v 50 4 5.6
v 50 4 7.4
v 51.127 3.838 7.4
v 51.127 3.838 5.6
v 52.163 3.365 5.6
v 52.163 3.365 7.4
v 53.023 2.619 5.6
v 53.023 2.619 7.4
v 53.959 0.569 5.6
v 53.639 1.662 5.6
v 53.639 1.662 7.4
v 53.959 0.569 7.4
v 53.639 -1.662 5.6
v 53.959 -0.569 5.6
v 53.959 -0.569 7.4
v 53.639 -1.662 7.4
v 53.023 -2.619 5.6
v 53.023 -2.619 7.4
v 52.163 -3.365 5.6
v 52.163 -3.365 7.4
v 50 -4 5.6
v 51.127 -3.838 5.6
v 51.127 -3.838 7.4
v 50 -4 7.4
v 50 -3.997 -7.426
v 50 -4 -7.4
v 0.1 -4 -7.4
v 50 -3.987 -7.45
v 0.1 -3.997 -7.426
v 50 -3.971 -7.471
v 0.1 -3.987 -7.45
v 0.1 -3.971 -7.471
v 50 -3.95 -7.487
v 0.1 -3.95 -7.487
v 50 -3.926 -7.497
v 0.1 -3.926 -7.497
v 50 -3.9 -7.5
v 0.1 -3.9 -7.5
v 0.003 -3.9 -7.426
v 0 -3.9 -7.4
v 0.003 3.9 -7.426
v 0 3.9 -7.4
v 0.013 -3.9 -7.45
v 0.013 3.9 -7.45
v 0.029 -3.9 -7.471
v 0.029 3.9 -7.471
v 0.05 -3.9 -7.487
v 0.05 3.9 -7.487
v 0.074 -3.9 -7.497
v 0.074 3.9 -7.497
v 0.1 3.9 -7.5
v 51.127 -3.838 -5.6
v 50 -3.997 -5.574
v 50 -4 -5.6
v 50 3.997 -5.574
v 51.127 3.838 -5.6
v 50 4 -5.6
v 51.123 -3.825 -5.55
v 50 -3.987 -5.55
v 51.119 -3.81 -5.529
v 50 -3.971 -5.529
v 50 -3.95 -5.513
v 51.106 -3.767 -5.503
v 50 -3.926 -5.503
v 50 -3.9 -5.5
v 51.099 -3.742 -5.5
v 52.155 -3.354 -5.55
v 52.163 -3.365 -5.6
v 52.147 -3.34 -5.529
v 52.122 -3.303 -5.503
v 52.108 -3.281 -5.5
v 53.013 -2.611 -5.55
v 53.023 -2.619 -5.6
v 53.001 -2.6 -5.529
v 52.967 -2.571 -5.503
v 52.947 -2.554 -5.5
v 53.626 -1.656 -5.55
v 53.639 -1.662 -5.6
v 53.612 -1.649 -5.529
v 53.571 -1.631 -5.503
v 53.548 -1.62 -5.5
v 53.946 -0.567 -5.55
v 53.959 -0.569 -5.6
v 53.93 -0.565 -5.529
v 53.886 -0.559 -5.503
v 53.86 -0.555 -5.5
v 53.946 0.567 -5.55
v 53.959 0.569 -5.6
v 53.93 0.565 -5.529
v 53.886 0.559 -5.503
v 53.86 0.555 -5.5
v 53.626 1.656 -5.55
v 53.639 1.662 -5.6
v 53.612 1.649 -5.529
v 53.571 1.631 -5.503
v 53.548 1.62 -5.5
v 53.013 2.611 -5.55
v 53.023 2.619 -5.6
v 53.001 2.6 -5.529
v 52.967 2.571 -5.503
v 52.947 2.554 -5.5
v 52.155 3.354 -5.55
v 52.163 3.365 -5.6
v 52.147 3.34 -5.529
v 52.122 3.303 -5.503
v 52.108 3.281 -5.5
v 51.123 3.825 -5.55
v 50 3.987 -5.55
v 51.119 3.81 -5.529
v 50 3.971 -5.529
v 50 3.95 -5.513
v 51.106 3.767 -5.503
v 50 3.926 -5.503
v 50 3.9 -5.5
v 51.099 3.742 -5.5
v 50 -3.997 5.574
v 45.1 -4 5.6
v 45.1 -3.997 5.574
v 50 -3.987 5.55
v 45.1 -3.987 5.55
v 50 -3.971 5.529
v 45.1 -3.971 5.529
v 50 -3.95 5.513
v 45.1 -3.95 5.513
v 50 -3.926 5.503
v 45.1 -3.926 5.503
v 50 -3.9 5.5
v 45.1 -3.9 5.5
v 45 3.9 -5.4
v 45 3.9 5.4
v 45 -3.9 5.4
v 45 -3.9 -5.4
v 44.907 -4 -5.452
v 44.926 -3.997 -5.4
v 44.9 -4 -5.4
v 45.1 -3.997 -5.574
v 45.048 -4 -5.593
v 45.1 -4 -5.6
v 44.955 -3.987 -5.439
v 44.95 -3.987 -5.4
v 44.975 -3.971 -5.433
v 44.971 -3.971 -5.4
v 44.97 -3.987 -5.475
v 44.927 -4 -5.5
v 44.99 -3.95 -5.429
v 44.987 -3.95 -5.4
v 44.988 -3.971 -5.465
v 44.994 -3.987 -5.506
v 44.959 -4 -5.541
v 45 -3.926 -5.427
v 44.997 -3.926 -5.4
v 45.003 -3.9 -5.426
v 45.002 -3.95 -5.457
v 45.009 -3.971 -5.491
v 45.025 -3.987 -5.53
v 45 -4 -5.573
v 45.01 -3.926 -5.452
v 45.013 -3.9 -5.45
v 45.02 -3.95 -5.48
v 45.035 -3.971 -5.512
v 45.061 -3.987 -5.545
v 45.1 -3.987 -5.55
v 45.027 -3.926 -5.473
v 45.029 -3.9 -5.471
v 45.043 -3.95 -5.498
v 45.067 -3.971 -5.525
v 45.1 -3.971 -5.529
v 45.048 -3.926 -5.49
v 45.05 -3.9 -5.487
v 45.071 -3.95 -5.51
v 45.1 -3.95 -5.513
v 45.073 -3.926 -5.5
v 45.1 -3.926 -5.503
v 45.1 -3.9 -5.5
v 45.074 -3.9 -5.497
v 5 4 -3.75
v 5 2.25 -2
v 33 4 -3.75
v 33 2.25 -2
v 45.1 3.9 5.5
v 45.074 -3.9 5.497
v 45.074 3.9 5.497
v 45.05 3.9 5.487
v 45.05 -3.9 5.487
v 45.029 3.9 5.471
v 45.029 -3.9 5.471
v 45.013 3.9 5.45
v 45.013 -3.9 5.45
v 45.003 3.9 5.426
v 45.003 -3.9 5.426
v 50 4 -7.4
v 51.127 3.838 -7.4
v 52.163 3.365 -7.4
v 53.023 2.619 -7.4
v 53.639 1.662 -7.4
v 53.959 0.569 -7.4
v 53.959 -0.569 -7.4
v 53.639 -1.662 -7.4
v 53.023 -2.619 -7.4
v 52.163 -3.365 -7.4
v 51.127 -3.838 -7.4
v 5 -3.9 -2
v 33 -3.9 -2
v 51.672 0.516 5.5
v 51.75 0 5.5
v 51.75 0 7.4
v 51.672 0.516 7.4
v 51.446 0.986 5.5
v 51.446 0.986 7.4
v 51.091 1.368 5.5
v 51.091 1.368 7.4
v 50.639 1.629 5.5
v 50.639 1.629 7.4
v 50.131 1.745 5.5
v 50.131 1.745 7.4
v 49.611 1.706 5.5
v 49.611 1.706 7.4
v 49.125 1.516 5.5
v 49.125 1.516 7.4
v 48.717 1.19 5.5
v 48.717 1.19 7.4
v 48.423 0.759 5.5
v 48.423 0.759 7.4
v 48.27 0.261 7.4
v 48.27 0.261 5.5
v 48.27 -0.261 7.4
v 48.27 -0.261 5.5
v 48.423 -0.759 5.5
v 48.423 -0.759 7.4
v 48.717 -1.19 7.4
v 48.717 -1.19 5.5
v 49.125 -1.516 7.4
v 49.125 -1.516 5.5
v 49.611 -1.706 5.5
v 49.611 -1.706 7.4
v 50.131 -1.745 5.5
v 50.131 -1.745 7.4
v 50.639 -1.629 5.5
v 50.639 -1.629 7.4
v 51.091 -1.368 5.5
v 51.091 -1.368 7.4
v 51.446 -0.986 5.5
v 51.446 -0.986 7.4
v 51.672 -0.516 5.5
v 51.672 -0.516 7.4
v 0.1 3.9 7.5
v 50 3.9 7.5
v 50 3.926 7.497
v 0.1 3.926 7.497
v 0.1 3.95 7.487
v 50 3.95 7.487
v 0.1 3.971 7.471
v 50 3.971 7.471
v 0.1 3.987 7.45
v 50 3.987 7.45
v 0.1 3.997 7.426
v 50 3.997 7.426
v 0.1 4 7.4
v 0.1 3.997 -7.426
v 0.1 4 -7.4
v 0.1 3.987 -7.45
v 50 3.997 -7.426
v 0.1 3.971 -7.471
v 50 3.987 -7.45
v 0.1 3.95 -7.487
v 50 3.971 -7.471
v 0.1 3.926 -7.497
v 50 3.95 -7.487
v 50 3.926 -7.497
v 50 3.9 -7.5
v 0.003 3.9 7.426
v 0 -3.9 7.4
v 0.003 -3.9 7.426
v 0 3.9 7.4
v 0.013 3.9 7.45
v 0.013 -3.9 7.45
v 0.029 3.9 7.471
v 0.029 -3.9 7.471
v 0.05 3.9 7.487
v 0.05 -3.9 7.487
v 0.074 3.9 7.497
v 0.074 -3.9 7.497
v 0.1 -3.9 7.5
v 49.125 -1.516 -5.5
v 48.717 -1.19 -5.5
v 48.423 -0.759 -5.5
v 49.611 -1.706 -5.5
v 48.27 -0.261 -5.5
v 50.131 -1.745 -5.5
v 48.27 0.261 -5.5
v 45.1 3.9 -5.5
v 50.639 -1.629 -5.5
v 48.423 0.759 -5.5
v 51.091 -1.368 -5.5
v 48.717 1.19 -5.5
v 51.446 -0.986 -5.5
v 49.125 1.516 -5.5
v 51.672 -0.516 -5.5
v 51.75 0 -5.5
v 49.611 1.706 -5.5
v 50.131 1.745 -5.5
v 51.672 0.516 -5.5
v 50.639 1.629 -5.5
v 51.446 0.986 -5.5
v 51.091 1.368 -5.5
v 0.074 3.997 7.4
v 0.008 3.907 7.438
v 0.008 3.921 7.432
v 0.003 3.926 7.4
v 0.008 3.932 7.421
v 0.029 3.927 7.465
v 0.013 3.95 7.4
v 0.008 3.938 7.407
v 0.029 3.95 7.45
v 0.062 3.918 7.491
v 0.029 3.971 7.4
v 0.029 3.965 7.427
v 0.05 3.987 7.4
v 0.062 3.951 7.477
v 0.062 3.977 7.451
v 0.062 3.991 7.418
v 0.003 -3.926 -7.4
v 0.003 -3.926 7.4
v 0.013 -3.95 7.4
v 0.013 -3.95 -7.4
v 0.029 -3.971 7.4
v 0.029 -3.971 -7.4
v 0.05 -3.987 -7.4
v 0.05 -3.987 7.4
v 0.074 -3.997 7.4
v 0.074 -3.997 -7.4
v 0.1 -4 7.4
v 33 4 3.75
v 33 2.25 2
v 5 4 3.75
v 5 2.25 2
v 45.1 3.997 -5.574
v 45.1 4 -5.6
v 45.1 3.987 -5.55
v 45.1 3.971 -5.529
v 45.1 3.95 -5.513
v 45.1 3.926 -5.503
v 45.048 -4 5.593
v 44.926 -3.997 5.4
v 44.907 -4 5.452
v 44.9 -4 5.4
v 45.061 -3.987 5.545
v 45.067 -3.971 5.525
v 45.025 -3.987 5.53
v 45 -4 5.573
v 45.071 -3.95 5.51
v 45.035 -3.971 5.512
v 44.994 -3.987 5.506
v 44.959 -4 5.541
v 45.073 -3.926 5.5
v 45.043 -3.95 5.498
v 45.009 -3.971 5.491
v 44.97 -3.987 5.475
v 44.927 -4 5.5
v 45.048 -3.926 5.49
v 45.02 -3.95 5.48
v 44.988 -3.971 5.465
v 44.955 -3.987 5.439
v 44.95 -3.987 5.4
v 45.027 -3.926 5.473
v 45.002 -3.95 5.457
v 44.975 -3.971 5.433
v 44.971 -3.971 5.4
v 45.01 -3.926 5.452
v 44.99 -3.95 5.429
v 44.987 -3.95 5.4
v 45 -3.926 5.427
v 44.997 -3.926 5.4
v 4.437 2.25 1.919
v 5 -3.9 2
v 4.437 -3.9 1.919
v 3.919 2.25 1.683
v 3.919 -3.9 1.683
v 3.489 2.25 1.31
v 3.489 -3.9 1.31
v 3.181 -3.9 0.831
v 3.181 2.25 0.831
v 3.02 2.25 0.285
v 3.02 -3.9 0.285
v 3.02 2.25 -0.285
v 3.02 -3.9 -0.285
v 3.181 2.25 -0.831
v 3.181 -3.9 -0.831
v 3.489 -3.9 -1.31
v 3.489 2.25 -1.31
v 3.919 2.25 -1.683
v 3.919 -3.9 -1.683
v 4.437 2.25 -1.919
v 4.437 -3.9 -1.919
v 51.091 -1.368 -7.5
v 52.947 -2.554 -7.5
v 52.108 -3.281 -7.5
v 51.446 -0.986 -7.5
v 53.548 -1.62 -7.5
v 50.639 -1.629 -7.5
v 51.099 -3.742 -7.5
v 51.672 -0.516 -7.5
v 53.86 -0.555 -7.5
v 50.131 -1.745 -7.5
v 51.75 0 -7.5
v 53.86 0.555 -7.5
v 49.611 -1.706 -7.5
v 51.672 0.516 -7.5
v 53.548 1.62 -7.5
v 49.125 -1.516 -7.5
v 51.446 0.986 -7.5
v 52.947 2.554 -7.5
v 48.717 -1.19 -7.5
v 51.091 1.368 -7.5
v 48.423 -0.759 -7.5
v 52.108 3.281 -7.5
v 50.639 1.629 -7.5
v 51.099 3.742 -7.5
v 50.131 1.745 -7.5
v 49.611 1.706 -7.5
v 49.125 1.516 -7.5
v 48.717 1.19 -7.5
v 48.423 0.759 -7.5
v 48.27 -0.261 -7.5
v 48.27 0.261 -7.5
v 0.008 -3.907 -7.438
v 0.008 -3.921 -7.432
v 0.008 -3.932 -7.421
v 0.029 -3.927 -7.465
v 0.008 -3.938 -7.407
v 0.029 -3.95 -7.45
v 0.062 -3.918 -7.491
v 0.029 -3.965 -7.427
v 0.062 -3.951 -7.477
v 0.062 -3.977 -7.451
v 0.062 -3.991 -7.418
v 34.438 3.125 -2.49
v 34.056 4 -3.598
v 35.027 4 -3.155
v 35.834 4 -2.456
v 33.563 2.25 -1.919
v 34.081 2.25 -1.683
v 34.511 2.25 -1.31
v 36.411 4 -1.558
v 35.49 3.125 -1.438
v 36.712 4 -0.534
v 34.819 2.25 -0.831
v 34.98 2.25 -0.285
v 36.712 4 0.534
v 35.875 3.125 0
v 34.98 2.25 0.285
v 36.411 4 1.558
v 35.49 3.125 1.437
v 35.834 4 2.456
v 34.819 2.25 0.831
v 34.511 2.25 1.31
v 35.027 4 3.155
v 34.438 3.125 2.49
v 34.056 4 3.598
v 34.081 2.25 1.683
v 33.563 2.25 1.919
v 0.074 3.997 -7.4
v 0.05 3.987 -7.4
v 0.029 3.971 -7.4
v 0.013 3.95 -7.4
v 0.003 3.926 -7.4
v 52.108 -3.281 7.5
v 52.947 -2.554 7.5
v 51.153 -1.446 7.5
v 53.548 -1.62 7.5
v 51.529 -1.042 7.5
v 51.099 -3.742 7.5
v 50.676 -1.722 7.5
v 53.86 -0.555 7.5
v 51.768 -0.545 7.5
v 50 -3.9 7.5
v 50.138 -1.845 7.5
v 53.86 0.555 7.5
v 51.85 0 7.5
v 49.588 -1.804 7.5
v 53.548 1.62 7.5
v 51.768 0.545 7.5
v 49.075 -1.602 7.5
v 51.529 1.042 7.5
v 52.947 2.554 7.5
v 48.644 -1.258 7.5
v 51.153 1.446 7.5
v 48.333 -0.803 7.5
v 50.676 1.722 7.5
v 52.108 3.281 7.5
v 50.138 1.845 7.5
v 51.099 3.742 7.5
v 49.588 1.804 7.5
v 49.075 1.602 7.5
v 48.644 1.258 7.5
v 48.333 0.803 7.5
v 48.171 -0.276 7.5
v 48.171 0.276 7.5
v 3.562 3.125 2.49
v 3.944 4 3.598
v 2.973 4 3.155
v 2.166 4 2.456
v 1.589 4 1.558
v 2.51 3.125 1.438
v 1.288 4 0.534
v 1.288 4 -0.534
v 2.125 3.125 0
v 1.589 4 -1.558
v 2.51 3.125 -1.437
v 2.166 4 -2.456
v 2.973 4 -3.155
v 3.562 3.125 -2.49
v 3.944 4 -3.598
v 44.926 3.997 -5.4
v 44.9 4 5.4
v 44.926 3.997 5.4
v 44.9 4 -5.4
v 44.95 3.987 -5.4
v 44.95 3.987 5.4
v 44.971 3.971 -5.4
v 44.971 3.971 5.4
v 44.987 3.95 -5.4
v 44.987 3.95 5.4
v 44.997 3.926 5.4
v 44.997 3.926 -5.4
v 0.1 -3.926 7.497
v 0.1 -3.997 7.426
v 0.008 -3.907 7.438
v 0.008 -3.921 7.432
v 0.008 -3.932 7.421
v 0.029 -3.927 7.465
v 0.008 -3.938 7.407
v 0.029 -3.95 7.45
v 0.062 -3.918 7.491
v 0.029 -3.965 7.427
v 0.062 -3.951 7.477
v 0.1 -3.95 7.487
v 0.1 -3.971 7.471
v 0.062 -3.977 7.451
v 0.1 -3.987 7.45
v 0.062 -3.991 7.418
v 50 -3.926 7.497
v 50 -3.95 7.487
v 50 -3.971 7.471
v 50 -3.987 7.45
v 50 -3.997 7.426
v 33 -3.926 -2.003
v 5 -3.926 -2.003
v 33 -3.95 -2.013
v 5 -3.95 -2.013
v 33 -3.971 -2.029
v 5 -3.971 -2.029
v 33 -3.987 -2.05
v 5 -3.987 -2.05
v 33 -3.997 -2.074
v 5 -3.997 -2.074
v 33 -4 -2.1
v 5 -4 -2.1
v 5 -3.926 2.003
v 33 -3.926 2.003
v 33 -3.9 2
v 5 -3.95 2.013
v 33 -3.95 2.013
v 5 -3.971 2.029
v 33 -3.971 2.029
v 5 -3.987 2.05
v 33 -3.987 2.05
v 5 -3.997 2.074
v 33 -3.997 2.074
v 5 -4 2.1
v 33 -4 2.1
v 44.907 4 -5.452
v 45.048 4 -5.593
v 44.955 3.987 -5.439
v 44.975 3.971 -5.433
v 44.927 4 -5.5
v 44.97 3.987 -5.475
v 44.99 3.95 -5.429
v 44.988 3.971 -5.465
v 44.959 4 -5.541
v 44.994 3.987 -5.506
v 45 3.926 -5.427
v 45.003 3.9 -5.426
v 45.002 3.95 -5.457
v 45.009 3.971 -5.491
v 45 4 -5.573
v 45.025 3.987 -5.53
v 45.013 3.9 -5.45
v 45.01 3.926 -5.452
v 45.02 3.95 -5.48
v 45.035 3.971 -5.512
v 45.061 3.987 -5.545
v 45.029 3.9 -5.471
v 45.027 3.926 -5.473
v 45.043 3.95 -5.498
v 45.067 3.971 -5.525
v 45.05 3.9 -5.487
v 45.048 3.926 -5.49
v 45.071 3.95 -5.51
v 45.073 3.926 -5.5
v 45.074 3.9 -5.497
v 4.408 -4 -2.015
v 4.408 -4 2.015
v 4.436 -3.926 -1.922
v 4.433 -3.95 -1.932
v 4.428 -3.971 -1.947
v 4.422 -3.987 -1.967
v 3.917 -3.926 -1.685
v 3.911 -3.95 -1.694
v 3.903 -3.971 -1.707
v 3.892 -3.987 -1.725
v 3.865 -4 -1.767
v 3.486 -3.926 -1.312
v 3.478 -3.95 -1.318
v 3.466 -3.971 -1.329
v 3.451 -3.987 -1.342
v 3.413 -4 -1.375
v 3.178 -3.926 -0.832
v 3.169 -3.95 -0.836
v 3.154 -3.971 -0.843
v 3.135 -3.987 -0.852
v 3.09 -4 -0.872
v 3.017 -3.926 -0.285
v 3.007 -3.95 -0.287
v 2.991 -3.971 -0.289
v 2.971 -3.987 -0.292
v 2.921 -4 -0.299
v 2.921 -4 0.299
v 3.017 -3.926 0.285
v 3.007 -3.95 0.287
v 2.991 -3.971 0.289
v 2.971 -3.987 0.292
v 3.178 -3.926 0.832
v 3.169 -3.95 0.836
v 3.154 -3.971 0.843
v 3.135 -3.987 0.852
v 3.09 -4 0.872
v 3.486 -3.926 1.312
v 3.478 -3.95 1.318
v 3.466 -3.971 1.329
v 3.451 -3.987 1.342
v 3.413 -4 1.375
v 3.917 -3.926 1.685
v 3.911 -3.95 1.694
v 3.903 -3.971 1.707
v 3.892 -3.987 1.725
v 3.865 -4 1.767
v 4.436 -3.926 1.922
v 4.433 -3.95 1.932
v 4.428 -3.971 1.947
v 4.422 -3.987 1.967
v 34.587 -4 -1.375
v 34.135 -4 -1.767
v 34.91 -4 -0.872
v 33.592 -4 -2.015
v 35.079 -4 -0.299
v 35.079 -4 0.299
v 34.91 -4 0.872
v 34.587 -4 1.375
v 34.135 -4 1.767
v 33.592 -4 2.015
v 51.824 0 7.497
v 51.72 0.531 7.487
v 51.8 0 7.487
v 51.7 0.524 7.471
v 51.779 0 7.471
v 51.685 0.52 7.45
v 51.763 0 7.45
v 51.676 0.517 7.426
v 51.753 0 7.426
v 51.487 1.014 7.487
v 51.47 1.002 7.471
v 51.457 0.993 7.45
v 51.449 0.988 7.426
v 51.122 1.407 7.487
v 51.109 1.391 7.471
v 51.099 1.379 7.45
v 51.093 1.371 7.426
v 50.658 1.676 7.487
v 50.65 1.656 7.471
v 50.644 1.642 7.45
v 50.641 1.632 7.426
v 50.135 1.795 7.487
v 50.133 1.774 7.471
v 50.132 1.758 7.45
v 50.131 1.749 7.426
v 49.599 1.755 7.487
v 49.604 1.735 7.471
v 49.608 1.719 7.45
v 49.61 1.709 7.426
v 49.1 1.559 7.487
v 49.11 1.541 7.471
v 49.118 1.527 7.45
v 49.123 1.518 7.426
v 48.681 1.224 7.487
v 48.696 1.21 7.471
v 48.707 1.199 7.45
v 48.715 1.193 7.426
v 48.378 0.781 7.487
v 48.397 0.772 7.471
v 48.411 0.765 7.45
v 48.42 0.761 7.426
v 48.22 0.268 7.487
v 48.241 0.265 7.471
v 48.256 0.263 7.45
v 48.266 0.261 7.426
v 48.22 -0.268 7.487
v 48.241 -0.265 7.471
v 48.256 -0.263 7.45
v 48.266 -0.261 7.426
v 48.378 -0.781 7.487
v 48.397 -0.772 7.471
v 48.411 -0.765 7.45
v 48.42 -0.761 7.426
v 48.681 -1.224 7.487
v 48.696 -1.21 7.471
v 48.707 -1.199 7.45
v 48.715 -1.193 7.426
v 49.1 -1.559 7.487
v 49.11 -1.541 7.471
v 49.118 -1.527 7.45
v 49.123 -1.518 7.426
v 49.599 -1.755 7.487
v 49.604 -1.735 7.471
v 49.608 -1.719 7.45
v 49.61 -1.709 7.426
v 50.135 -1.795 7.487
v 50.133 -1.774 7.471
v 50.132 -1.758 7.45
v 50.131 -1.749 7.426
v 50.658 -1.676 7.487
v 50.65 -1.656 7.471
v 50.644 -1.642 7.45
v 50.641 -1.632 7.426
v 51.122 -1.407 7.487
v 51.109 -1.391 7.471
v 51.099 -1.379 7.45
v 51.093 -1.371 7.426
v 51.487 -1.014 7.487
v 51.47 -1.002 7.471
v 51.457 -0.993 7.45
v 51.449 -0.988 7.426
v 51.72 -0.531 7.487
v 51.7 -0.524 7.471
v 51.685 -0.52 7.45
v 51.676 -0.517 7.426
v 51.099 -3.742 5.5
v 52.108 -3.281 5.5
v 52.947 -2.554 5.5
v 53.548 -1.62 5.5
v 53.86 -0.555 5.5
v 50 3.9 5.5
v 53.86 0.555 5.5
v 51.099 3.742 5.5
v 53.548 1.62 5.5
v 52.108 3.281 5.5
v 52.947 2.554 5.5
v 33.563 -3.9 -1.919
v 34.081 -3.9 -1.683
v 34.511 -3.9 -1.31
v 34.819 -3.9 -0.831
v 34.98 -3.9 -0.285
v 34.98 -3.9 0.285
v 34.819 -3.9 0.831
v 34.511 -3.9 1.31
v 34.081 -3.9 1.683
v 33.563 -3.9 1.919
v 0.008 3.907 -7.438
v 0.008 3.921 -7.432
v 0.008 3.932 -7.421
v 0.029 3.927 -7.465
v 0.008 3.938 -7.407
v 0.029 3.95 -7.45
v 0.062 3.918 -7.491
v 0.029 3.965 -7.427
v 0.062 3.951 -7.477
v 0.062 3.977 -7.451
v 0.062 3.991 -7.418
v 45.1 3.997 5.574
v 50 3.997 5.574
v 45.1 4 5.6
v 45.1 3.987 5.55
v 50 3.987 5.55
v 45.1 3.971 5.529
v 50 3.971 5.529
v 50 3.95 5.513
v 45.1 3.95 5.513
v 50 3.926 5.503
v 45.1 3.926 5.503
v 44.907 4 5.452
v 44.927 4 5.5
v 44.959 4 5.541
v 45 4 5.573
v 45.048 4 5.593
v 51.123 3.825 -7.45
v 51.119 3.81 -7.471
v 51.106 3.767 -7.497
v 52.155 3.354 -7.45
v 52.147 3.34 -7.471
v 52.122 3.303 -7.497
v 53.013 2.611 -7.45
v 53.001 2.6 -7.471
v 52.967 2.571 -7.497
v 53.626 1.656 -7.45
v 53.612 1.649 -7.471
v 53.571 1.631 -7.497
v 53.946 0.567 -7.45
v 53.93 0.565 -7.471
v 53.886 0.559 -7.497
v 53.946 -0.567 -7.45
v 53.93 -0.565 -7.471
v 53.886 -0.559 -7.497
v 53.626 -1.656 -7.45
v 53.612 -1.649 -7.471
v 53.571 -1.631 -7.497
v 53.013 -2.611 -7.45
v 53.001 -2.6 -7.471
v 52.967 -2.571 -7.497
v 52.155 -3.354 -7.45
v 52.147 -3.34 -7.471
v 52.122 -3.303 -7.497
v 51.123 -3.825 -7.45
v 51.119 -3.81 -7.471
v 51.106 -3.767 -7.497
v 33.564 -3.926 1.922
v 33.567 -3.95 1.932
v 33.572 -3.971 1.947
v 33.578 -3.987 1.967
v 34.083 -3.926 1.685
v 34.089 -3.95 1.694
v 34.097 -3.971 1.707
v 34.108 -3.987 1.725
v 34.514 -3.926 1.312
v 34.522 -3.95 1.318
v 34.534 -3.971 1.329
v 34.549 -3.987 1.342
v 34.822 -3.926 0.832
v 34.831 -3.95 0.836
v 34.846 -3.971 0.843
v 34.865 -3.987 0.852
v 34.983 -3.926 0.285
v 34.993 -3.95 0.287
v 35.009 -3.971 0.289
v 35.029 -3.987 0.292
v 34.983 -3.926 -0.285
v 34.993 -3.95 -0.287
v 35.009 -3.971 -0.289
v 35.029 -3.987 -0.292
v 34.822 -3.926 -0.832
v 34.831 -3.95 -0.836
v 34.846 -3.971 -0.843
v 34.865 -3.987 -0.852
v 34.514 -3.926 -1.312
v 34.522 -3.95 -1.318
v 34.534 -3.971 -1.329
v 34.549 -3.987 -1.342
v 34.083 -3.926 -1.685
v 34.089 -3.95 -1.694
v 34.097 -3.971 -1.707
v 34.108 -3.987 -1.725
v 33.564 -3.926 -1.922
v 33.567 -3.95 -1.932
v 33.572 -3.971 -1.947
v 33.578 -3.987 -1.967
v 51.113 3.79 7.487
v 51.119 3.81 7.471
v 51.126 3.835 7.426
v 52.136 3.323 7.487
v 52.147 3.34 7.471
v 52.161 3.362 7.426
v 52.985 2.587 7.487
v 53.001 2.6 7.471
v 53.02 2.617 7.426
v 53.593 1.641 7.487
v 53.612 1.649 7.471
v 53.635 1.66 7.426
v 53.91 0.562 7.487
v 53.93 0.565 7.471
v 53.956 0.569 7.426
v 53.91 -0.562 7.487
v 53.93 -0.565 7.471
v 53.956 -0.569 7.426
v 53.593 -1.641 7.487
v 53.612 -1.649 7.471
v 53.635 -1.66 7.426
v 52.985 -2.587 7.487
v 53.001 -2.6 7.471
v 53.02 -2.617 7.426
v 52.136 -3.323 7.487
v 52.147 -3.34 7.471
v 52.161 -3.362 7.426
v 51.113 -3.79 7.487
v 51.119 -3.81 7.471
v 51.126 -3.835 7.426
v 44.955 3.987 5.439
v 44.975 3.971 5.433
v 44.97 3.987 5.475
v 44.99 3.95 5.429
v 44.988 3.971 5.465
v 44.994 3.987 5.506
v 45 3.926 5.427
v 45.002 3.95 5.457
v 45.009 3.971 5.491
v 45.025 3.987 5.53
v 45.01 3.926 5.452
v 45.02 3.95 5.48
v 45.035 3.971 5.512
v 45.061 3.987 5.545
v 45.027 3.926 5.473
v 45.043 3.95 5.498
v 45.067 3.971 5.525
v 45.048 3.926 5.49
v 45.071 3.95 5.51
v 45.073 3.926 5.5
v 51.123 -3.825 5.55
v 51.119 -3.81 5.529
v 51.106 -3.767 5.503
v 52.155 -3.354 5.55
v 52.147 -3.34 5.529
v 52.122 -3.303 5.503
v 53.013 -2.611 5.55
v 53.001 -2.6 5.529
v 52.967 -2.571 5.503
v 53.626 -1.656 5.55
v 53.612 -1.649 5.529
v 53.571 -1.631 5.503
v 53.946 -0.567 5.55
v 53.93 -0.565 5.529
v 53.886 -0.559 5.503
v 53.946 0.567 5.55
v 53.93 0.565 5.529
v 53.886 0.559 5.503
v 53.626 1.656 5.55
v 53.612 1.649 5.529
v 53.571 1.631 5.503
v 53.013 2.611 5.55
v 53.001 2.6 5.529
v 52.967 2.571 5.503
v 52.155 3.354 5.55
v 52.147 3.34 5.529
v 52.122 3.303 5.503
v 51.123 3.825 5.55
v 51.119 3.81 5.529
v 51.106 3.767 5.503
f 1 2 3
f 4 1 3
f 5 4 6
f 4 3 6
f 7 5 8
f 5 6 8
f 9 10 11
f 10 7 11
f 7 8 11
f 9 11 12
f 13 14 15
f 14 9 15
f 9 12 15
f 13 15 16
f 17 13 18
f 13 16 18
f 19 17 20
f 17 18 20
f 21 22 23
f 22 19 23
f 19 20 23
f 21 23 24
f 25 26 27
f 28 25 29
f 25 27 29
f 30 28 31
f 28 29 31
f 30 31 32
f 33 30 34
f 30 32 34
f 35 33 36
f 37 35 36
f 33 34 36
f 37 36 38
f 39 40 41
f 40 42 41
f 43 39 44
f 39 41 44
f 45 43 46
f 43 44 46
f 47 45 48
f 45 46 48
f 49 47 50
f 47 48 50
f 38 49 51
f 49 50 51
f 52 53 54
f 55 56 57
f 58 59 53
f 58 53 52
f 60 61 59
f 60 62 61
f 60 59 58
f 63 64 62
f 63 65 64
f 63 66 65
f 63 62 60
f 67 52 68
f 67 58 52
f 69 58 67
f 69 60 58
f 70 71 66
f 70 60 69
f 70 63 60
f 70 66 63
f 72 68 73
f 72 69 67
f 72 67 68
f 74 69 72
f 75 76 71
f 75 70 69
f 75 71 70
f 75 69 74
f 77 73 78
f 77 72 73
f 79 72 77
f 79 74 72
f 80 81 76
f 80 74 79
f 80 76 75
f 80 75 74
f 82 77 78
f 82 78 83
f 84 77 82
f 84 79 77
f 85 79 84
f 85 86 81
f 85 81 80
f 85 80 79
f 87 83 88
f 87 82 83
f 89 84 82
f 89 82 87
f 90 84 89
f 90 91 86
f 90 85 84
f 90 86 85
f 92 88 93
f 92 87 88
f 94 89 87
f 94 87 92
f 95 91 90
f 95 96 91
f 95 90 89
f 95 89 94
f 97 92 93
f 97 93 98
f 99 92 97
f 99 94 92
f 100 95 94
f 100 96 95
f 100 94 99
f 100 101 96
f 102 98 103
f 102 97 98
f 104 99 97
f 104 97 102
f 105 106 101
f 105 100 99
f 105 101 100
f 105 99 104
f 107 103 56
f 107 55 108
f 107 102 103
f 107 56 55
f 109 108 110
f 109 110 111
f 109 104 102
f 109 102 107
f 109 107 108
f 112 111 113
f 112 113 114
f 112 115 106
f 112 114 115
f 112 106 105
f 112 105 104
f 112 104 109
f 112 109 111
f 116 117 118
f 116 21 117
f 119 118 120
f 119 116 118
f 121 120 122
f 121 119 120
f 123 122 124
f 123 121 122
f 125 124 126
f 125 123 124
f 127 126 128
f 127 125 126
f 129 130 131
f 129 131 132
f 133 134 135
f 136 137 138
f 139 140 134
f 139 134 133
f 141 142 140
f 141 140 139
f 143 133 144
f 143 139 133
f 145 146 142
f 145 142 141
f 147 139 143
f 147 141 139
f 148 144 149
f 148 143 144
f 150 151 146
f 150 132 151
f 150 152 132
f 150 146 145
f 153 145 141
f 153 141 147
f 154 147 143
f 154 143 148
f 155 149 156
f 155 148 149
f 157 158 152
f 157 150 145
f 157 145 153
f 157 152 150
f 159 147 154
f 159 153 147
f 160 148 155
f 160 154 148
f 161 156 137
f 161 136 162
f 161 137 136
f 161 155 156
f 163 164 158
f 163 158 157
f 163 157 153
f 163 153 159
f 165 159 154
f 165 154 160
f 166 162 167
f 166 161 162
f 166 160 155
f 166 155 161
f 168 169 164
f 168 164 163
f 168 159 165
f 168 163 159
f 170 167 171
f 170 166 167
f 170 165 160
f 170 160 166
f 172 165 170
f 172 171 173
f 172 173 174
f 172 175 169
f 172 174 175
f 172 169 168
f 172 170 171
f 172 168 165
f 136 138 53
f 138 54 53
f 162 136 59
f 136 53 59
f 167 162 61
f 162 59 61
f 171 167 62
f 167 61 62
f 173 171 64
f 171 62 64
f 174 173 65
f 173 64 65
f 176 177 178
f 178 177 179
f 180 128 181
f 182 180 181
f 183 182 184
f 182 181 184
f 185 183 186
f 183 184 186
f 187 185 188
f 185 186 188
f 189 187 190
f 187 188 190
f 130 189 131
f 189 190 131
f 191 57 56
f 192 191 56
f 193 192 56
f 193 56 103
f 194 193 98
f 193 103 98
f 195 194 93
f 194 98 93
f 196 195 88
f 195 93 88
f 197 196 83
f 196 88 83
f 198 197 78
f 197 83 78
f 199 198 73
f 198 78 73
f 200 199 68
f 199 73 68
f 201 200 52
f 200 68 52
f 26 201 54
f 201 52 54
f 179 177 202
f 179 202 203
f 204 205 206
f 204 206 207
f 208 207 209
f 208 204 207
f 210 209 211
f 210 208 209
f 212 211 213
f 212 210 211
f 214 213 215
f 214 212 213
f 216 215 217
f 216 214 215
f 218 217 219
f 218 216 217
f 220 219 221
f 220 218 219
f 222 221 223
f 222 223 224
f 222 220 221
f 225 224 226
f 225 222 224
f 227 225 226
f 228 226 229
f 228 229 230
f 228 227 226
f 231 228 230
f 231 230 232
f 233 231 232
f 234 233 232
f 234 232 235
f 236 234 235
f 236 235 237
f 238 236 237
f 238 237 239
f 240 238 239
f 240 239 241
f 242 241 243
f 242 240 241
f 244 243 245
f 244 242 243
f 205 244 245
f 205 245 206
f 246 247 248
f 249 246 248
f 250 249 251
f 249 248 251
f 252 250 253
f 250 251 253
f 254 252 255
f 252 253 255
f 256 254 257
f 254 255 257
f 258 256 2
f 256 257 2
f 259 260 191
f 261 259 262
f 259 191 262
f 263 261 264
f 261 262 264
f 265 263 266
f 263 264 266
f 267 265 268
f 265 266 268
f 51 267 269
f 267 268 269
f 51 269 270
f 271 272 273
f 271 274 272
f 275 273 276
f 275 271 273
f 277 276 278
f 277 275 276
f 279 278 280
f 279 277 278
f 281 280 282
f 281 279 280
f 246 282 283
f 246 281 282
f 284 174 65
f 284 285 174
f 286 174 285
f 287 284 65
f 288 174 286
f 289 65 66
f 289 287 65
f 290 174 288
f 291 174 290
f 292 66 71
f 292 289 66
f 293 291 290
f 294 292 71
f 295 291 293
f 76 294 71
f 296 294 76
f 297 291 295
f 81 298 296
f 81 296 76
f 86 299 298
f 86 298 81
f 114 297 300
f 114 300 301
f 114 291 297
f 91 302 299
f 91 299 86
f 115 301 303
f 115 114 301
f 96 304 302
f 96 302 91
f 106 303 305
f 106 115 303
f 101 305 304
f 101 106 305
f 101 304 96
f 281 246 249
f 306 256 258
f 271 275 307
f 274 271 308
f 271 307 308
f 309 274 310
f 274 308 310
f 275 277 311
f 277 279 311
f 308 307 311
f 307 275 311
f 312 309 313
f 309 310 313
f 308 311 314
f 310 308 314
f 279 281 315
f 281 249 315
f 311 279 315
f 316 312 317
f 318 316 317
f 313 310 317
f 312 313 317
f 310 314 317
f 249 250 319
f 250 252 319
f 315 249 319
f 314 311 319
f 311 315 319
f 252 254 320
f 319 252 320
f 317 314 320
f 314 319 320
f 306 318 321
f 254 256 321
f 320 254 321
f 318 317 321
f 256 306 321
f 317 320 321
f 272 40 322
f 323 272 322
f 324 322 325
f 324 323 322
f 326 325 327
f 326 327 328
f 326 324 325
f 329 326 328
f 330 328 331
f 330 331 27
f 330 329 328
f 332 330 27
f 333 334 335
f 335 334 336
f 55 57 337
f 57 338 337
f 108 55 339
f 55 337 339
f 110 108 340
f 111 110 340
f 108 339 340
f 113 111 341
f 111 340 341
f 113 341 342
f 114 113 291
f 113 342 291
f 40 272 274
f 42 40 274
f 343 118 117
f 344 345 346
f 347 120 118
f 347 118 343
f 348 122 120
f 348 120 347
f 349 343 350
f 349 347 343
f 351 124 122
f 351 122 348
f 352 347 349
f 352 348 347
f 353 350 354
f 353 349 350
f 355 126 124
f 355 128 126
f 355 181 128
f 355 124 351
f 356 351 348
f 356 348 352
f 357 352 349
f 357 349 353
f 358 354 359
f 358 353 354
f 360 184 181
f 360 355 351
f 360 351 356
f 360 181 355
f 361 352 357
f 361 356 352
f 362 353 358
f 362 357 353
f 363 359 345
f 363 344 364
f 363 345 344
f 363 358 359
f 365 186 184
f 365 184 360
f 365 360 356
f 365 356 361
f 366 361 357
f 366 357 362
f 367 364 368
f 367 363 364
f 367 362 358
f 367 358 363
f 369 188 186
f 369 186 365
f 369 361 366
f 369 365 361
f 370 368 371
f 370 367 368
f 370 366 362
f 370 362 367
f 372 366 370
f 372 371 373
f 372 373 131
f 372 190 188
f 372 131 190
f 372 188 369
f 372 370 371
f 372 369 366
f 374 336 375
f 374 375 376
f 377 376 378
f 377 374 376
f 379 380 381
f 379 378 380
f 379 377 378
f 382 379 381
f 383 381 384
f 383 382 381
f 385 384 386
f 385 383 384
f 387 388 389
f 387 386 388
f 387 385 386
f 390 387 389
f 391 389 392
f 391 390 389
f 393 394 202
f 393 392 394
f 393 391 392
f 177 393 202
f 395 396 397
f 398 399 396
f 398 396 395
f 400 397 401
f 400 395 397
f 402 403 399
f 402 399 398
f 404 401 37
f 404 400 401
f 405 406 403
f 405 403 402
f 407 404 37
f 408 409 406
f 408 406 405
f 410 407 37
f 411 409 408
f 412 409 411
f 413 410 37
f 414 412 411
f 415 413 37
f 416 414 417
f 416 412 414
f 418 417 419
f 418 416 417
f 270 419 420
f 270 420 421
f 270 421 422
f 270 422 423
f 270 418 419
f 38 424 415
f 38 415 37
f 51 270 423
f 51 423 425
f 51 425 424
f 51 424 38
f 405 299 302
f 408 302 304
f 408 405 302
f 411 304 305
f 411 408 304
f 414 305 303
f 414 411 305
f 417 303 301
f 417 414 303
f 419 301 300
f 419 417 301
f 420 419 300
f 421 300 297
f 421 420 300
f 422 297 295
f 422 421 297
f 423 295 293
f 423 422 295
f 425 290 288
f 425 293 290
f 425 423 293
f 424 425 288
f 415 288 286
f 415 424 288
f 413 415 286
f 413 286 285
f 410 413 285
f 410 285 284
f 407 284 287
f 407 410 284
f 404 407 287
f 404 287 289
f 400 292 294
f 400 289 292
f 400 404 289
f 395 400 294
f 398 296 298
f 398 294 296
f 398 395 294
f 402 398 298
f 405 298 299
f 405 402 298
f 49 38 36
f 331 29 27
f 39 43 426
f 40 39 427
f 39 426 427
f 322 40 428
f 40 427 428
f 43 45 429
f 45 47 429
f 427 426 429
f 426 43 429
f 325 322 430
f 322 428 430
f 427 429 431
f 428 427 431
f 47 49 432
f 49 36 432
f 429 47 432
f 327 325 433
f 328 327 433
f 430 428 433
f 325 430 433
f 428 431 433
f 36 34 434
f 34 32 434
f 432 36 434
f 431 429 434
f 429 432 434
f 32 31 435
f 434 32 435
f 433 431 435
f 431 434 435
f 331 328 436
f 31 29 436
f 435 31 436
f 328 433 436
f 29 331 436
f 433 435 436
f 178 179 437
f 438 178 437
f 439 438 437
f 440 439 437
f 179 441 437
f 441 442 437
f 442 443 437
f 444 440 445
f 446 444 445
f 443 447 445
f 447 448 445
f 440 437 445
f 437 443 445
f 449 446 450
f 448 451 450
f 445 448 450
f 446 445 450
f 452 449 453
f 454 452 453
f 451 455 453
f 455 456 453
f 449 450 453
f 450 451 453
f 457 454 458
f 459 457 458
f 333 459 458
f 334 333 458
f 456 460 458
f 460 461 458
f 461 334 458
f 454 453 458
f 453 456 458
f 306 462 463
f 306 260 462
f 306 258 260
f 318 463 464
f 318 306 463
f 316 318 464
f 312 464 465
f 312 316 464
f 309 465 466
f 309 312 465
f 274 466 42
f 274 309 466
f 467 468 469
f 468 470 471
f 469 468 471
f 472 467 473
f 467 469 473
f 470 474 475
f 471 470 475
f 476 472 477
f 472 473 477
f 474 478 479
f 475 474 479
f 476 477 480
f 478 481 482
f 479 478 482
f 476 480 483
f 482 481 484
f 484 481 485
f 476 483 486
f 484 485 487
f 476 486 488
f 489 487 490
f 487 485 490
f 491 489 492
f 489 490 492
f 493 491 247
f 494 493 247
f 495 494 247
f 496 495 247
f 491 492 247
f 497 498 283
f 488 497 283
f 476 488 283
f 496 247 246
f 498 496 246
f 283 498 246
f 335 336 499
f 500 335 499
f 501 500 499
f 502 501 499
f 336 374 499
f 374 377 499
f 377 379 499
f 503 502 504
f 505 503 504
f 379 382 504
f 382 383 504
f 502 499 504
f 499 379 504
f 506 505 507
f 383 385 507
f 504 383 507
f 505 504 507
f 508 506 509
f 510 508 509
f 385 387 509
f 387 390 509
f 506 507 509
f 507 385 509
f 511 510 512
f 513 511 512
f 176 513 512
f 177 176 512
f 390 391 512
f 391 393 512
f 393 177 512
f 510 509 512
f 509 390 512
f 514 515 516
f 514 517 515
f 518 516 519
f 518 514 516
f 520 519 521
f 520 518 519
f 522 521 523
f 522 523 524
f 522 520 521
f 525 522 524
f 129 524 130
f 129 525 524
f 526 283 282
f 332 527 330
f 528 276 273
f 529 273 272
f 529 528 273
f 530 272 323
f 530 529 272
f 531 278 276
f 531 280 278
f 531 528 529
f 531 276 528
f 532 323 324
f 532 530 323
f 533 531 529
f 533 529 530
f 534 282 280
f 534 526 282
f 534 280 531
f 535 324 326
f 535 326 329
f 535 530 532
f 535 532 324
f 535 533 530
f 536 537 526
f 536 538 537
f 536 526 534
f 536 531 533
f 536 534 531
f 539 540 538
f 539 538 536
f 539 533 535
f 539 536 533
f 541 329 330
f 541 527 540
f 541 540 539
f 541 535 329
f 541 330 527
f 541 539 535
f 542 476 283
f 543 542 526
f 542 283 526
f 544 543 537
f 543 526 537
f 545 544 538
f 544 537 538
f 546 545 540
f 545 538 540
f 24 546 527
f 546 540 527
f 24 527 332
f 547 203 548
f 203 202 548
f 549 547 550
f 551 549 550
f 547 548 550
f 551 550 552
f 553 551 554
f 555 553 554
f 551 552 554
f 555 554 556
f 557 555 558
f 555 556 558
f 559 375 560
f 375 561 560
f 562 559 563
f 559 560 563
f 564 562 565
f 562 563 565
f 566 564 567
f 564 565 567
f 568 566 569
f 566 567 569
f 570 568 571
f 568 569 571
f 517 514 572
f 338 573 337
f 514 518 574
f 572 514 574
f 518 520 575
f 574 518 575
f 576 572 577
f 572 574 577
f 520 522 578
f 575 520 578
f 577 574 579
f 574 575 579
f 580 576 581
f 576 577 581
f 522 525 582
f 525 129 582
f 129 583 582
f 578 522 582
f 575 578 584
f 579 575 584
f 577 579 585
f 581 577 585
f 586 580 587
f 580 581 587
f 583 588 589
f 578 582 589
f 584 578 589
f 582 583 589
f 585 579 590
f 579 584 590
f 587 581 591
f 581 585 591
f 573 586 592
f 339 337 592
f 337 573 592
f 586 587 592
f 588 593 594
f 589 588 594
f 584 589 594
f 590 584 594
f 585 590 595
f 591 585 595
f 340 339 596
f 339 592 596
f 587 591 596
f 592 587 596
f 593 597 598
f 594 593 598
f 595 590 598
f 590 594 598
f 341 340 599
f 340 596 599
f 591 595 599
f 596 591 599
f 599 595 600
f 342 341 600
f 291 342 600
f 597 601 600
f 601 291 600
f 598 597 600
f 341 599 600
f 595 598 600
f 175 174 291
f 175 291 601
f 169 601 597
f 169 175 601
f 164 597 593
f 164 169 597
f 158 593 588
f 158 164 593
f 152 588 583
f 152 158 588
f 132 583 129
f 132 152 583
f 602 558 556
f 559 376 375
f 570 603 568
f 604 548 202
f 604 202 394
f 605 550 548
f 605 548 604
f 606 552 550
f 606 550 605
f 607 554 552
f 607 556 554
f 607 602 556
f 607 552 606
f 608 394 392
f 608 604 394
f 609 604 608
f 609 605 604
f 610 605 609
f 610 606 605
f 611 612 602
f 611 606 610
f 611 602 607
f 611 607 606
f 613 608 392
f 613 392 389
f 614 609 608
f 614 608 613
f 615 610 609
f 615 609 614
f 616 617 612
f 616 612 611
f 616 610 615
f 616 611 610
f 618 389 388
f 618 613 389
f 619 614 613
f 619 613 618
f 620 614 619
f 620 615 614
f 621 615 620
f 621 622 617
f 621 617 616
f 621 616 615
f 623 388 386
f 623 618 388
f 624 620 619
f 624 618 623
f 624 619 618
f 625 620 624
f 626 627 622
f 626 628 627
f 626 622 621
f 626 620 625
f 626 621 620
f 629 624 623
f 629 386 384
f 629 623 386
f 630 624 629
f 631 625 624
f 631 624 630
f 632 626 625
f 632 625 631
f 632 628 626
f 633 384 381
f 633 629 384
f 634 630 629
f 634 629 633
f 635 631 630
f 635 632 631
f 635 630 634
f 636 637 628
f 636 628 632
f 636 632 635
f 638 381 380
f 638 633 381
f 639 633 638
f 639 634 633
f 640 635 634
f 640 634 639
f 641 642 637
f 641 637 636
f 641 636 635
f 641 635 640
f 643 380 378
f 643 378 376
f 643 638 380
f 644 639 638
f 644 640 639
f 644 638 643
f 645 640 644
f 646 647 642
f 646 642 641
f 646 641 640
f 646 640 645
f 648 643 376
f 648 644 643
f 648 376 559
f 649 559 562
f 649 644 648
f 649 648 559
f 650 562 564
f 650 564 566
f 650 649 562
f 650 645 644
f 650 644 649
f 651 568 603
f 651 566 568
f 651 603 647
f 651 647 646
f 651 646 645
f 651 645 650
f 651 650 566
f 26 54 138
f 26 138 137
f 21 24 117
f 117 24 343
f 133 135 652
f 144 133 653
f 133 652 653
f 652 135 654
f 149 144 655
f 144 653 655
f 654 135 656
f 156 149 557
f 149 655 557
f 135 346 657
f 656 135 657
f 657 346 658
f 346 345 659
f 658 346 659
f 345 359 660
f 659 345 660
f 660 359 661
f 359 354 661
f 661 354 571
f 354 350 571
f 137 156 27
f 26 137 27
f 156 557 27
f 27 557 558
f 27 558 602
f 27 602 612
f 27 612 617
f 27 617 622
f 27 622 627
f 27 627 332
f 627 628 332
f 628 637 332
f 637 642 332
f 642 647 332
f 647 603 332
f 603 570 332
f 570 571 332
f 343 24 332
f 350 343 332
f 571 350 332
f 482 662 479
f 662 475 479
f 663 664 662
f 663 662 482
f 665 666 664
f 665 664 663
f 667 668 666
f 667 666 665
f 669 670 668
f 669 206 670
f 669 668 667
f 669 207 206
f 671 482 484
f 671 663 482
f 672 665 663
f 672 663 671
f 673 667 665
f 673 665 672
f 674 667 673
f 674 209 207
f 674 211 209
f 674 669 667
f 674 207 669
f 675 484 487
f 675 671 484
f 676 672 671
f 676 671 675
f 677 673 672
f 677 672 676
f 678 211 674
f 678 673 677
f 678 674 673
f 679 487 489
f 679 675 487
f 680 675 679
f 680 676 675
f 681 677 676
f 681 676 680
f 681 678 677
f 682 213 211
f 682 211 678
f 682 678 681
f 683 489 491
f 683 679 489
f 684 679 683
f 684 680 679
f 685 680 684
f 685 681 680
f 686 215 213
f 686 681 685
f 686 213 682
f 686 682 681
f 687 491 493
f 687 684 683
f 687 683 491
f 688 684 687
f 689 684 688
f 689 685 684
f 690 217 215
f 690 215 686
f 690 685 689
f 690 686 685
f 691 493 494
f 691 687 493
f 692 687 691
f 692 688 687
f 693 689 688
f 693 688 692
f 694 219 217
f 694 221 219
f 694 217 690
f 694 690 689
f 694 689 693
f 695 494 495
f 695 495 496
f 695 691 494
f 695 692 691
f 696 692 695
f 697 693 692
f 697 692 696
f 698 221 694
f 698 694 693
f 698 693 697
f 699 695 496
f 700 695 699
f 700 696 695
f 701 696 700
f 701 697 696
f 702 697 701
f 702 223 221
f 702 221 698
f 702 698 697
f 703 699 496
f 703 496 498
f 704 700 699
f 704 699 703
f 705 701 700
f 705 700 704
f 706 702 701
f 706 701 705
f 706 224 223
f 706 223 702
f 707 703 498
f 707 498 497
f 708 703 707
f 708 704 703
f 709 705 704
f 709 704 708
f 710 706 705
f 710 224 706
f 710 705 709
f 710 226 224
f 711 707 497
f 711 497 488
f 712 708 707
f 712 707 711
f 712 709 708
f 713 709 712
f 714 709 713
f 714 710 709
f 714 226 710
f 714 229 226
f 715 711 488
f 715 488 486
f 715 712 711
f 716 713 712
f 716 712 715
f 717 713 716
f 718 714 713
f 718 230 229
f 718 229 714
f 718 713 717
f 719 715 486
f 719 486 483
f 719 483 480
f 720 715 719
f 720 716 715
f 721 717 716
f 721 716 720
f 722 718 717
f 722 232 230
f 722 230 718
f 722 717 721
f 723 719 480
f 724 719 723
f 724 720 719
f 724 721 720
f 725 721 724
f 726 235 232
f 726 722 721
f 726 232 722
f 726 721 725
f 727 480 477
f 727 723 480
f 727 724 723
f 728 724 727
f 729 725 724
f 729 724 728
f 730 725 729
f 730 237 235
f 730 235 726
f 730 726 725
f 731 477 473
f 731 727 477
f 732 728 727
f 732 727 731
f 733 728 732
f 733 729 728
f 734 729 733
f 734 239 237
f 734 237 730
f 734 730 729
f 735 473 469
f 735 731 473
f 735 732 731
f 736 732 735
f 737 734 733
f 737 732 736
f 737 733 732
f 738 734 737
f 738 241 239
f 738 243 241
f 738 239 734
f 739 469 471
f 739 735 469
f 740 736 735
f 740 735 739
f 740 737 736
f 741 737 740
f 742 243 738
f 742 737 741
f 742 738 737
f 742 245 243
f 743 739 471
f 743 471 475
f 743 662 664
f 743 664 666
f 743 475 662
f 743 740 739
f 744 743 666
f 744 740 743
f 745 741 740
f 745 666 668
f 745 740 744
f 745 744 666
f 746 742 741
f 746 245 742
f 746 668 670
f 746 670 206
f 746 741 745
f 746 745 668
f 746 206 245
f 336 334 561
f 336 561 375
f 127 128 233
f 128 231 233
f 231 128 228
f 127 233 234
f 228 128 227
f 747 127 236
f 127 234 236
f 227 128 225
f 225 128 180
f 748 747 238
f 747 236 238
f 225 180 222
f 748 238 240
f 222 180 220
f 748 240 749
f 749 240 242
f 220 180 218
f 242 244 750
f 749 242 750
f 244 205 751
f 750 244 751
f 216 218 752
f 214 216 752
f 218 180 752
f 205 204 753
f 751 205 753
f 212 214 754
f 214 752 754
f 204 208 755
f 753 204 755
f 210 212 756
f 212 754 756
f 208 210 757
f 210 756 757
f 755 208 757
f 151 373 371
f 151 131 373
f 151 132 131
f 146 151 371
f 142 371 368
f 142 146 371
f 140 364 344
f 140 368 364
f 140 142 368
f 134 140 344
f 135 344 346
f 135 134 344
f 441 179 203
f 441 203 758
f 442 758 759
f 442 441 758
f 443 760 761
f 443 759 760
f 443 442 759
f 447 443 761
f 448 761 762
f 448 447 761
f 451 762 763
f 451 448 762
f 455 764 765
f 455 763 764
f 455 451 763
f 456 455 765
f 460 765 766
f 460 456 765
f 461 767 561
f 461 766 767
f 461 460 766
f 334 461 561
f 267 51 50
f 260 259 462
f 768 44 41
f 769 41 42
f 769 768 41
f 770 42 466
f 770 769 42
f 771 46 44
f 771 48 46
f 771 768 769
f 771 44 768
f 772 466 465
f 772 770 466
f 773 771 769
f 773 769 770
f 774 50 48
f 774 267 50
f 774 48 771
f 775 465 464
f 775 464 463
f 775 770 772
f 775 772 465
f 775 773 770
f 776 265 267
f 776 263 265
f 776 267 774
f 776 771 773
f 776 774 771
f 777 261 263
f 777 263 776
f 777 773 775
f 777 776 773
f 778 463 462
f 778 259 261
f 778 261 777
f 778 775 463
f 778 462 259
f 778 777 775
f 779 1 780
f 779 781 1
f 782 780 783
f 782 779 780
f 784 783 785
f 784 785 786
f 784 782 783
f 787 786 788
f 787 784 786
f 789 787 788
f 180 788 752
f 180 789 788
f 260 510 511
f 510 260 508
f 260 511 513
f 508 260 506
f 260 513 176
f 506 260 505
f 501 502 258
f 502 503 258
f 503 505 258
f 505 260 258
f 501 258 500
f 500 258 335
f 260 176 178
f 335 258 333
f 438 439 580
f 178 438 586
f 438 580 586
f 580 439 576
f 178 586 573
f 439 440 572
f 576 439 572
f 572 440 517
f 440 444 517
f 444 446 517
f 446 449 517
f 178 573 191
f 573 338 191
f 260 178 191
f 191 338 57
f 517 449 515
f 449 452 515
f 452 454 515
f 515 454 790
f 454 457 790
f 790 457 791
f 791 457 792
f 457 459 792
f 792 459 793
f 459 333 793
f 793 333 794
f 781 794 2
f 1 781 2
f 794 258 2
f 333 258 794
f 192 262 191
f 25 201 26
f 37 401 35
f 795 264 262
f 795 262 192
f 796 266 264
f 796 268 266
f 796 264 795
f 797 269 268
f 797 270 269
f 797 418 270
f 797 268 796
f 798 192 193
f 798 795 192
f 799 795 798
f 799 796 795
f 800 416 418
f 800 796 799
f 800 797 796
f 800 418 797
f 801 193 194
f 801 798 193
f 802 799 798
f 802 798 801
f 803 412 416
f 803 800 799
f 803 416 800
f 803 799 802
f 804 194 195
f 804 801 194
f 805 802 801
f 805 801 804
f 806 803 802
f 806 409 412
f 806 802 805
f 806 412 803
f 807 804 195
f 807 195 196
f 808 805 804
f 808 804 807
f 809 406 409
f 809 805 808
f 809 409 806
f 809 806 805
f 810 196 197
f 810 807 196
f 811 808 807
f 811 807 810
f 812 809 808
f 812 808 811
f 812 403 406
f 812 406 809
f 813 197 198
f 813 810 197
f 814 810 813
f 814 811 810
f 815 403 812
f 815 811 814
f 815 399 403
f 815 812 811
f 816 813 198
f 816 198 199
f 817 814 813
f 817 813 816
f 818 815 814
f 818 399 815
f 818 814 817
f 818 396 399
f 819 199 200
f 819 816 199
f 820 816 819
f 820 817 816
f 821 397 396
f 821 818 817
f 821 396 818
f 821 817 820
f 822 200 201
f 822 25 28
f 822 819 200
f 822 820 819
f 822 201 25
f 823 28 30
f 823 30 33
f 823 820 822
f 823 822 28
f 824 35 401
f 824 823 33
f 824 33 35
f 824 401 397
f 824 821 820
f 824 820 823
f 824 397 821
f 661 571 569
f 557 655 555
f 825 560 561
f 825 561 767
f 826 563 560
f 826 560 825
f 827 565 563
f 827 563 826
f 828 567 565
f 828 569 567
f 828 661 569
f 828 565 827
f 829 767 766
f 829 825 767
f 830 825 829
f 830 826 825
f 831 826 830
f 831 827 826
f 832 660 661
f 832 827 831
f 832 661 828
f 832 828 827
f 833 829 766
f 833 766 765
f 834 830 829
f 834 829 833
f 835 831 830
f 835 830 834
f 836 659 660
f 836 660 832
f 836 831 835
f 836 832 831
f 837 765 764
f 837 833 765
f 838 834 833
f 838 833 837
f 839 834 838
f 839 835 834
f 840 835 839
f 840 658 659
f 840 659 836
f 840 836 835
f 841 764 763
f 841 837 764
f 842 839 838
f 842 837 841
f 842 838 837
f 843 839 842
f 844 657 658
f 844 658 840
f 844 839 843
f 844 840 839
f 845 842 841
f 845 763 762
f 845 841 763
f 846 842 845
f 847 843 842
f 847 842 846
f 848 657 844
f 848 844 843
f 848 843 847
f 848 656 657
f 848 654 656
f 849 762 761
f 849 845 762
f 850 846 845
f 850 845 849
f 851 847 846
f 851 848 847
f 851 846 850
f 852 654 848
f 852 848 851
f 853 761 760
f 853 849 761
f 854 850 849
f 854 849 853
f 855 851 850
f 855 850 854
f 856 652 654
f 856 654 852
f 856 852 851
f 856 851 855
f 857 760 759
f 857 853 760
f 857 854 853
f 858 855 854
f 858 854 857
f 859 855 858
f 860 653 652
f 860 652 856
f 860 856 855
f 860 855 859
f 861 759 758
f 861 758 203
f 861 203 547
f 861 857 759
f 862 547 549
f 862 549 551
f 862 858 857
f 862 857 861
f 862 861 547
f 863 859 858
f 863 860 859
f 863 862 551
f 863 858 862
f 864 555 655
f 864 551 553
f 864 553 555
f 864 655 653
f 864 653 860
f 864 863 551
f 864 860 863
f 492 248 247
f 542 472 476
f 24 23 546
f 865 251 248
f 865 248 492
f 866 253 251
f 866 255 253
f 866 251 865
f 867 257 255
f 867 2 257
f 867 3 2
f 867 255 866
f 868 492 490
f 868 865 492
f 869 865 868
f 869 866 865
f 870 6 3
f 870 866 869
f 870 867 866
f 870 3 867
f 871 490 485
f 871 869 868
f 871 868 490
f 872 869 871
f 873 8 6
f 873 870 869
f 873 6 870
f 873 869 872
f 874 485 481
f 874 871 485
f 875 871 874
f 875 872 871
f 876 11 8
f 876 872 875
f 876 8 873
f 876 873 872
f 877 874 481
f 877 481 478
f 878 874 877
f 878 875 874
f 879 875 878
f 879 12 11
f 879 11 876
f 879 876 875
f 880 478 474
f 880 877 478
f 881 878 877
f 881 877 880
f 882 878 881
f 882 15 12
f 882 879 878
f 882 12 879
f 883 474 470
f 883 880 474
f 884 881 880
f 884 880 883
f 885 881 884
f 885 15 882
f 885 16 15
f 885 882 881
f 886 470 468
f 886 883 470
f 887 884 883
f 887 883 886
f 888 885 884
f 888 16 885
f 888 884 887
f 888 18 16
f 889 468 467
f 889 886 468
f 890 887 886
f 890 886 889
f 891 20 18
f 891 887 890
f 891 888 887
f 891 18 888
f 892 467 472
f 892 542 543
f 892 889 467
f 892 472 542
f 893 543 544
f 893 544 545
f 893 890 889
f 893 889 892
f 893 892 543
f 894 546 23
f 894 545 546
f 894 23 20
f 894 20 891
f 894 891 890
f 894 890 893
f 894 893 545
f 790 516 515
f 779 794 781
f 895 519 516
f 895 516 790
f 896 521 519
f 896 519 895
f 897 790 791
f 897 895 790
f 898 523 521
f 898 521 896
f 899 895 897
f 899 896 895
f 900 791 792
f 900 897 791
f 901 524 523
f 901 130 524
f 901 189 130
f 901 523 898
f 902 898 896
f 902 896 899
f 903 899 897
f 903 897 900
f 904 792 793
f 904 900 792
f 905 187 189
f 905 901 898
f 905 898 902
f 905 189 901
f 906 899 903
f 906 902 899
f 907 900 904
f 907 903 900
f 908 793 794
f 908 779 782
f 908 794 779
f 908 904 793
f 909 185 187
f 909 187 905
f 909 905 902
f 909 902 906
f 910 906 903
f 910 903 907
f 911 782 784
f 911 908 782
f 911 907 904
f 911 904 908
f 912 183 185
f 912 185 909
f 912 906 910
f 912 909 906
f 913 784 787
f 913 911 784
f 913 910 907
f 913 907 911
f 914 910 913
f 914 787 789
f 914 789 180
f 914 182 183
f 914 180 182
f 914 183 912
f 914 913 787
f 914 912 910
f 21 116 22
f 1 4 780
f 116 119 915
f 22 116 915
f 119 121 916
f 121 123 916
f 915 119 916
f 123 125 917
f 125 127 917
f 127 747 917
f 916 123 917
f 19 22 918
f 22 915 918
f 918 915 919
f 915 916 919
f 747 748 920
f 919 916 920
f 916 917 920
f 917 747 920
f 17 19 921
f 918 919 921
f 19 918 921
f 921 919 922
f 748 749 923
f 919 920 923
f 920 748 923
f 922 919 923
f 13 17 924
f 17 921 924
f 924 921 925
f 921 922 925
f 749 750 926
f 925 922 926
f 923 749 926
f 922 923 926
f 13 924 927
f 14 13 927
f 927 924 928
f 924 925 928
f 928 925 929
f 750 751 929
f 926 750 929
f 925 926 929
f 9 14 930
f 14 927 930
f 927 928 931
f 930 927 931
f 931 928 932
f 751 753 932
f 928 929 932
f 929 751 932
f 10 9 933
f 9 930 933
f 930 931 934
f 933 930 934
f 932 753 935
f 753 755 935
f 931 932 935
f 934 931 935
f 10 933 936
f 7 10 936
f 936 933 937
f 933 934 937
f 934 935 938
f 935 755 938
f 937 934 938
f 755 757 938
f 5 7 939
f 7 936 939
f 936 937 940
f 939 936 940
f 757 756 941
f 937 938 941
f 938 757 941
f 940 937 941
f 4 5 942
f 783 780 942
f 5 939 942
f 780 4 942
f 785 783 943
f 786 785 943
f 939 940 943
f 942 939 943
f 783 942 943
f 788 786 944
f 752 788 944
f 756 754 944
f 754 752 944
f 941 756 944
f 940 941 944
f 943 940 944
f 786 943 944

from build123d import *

# Parameters (mm, degrees)
SKETCH1_R           = 1.75
BOSS_EXTRUDE1_DEPTH = 7.5
SKETCH2_W           = 9
SKETCH2_H           = 11
CUT_EXTRUDE1_DEPTH  = 56.102177815
CUT_EXTRUDE2_DEPTH  = 56.102177815
FILLET1_R           = 0.1
CHAMFER1_SIZE       = 1.75


with BuildPart() as part:
    # Sketch1 → Boss-Extrude1 (new, symmetric)
    with BuildSketch(Plane.XY):
        with BuildLine():
            Line((0, 4), (50, 4))
            ThreePointArc((50, 4), (54, 0), (50, -4))
            Line((50, -4), (0, -4))
            Line((0, -4), (0, 4))
        make_face()
        with Locations((50, 0)):
            Circle(SKETCH1_R, mode=Mode.SUBTRACT)
    extrude(amount=BOSS_EXTRUDE1_DEPTH, both=True)

    # Sketch2 → Cut-Extrude1 (cut, through all)
    with BuildSketch(Plane(origin=(0, 4, 0), x_dir=(1, 0, 0), z_dir=(0, 1, 0))):
        with Locations((49.5, 0)):
            Rectangle(SKETCH2_W, SKETCH2_H)
    extrude(amount=-CUT_EXTRUDE1_DEPTH, mode=Mode.SUBTRACT)

    # Sketch3 → Cut-Extrude2 (cut, through all)
    with BuildSketch(Plane(origin=(0, 4, 0), x_dir=(1, 0, 0), z_dir=(0, 1, 0))):
        with BuildLine():
            Line((5, 2), (33, 2))
            ThreePointArc((33, 2), (35, 0), (33, -2))
            Line((33, -2), (5, -2))
            ThreePointArc((5, -2), (3, 0), (5, 2))
        make_face()
    extrude(amount=-CUT_EXTRUDE2_DEPTH, mode=Mode.SUBTRACT)

    # Fillet1
    fillet1_edges = [part.edges().sort_by_distance(p)[0] for p in [
        (48.25, 0, 7.5),
        (54, 0, 7.5),
        (25, 4, 7.5),
        (54, 0, 5.5),
        (47.5, -4, 5.5),
        (54, 0, -5.5),
        (47.5, -4, -5.5),
        (45, 0, -5.5),
        (45, -4, 0),
        (45, 0, 5.5),
        (47.5, 4, 5.5),
        (47.5, 4, -5.5),
        (45, 4, 0),
        (0, 0, 7.5),
        (25, 4, -7.5),
        (3, -4, 0),
        (19, -4, -2),
        (35, -4, 0),
        (19, -4, 2),
        (54, 0, -7.5),
        (25, -4, -7.5),
        (0, 0, -7.5),
        (0, 4, 0),
        (0, -4, 0),
        (25, -4, 7.5),
    ]]
    fillet(fillet1_edges, radius=FILLET1_R)

    # Chamfer1
    chamfer1_edges = [part.edges().sort_by_distance(p)[0] for p in [
        (3, 4, 0),
        (19, 4, 2),
        (35, 4, 0),
        (19, 4, -2),
    ]]
    chamfer(chamfer1_edges, length=CHAMFER1_SIZE)


solid = part.part
